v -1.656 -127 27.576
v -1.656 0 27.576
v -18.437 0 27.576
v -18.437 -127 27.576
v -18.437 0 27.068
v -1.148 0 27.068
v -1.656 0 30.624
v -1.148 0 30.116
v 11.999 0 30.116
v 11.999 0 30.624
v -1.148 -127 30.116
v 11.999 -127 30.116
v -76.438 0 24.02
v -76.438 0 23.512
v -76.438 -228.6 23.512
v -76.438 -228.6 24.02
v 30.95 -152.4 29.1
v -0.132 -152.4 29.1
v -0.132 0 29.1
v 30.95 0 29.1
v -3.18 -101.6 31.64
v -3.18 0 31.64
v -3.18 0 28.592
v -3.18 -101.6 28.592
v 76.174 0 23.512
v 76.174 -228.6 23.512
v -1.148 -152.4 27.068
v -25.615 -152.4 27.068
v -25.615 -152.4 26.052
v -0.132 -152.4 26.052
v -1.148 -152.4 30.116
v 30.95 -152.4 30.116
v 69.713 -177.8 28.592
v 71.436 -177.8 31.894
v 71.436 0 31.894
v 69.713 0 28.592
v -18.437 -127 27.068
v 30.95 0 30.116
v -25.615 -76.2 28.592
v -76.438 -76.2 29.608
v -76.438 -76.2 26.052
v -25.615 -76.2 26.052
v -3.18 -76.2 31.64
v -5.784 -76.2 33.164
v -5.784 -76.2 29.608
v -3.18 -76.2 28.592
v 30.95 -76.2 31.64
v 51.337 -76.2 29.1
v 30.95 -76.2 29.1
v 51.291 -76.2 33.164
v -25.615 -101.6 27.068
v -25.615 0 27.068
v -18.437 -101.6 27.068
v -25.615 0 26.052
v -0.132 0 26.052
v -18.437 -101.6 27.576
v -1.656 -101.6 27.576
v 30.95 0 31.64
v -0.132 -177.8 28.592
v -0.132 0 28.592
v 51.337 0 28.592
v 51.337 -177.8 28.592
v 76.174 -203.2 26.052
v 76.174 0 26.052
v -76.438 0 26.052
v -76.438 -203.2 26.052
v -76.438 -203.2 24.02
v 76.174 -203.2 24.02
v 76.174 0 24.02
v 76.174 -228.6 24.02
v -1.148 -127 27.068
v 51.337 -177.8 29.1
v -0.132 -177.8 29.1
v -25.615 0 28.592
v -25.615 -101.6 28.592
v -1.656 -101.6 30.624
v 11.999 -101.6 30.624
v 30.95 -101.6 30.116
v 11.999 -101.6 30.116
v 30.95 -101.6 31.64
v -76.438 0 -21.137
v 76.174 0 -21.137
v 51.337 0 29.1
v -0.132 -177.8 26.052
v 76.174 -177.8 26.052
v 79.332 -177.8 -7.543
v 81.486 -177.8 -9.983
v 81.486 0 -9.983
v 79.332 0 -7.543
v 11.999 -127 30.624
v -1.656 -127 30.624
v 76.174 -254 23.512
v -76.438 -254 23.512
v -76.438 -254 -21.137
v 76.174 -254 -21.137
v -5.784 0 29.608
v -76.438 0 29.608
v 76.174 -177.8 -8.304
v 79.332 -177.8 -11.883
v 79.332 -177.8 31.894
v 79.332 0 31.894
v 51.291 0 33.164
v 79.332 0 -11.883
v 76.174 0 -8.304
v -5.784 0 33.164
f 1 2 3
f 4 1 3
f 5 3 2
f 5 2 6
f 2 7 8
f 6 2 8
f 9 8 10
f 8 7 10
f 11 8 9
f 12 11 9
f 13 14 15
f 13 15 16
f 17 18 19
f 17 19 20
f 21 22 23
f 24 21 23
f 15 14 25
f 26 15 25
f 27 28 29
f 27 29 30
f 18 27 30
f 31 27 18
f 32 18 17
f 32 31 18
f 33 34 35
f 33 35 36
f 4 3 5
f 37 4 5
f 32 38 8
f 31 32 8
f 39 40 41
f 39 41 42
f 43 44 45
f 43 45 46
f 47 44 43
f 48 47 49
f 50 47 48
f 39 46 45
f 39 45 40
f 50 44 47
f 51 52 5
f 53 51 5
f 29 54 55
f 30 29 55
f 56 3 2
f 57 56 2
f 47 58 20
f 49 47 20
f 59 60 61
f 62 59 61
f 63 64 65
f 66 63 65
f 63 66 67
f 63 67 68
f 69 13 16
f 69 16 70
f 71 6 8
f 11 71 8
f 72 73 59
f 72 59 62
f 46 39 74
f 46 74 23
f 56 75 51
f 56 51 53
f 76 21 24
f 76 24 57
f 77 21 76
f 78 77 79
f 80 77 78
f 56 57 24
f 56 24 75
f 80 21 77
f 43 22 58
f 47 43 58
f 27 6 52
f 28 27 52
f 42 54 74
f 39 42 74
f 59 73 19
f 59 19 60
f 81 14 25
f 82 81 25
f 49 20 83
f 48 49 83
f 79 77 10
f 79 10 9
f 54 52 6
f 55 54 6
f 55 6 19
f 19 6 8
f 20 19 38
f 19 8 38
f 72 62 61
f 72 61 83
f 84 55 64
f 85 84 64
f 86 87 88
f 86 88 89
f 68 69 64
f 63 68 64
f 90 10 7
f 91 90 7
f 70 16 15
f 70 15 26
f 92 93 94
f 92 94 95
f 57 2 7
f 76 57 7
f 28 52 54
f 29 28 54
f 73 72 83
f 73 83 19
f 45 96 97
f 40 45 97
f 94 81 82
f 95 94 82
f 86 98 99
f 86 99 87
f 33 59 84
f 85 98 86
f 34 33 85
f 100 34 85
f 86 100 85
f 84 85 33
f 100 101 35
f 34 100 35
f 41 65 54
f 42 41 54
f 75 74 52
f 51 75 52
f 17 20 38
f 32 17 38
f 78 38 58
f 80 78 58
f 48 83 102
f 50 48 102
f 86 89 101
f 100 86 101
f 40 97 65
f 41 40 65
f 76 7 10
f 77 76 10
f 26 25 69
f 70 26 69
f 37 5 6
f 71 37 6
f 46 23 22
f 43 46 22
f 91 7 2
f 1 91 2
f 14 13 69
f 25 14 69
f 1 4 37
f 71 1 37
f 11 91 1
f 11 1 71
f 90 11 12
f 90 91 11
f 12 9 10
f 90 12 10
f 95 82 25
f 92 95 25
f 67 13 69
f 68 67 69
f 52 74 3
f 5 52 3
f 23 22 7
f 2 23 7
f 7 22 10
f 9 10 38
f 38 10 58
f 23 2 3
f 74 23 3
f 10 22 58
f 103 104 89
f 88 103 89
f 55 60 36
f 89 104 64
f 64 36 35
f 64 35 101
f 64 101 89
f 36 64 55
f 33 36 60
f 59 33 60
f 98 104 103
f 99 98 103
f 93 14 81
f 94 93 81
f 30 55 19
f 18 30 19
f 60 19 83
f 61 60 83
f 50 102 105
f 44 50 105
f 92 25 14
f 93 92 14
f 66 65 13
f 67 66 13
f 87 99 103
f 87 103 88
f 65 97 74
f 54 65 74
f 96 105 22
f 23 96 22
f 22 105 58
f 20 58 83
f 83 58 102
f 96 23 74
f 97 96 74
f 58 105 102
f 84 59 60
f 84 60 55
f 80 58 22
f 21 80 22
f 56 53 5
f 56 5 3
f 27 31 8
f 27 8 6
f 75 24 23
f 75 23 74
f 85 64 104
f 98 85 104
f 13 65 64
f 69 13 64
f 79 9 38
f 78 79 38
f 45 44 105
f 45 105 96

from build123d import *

# Parameters (mm, degrees)
F1_DEPTH = 254
F0_W     = 152.611755
F0_H     = 0.508
F2_DEPTH = 228.6
F3_DEPTH = 203.2
F4_DEPTH = 177.8
F5_DEPTH = 177.8
F6_DEPTH = 152.4
F7_DEPTH = 127
F8_DEPTH = 101.6
F9_DEPTH = 76.2


with BuildPart() as f1:
    # F0 (on Front) → F1 (new body)
    with BuildSketch(Plane.XZ):
        Polygon((76.173723, 23.512076), (-76.438032, 23.512076), (-76.438032, -21.137271), (76.173723, -21.137271), (76.173723, -8.303774), align=None)
    extrude(amount=F1_DEPTH)


with BuildPart() as f2:
    # F0 (on Front) → F2 (new body)
    with BuildSketch(Plane.XZ):
        with Locations((-0.132154, 23.766076)):
            Rectangle(F0_W, F0_H)
    extrude(amount=F2_DEPTH)


with BuildPart() as f3:
    # F0 (on Front) → F3 (new body)
    with BuildSketch(Plane.XZ):
        Polygon((-76.438032, 26.052076), (-76.438032, 24.020076), (76.173723, 24.020076), (76.173723, 26.052076), (-0.132155, 26.052076), (-25.615305, 26.052076), align=None)
    extrude(amount=F3_DEPTH)


with BuildPart() as f4:
    # F0 (on Front) → F4 (new body)
    with BuildSketch(Plane.XZ):
        Polygon((76.173723, 24.020076), (76.173723, 23.512076), (76.173723, -8.303774), (79.332203, -11.883393), (81.485704, -9.983249), (79.332203, -7.542609), (79.332203, 31.894118), (71.43601, 31.894118), (69.713205, 28.592076), (51.336631, 28.592076), (-0.132155, 28.592076), (-0.132155, 26.052076), (76.173723, 26.052076), align=None)
    extrude(amount=F4_DEPTH)


with BuildPart() as f5:
    # F0 (on Front) → F5 (new body)
    with BuildSketch(Plane.XZ):
        Polygon((-0.132155, 29.100076), (-0.132155, 28.592076), (51.336631, 28.592076), (51.336631, 29.100076), (30.95011, 29.100076), align=None)
    extrude(amount=F5_DEPTH)


with BuildPart() as f6:
    # F0 (on Front) → F6 (new body)
    with BuildSketch(Plane.XZ):
        Polygon((-25.615305, 27.068076), (-25.615305, 26.052076), (-0.132155, 26.052076), (-0.132155, 28.592076), (-0.132155, 29.100076), (30.95011, 29.100076), (30.95011, 30.116076), (11.999259, 30.116076), (-1.148155, 30.116076), (-1.148155, 27.068076), (-18.436953, 27.068076), align=None)
    extrude(amount=F6_DEPTH)


with BuildPart() as f7:
    # F0 (on Front) → F7 (new body)
    with BuildSketch(Plane.XZ):
        Polygon((-18.436953, 27.576076), (-18.436953, 27.068076), (-1.148155, 27.068076), (-1.148155, 30.116076), (11.999259, 30.116076), (11.999259, 30.624076), (-1.656155, 30.624076), (-1.656155, 27.576076), align=None)
    extrude(amount=F7_DEPTH)


with BuildPart() as f8:
    # F0 (on Front) → F8 (new body)
    with BuildSketch(Plane.XZ):
        Polygon((-25.615305, 28.592076), (-25.615305, 27.068076), (-18.436953, 27.068076), (-18.436953, 27.576076), (-1.656155, 27.576076), (-1.656155, 30.624076), (11.999259, 30.624076), (11.999259, 30.116076), (30.95011, 30.116076), (30.95011, 31.640076), (-3.180155, 31.640076), (-3.180155, 28.592076), align=None)
    extrude(amount=F8_DEPTH)


with BuildPart() as f9:
    # F0 (on Front) → F9 (new body)
    with BuildSketch(Plane.XZ):
        Polygon((-76.438032, 29.608076), (-76.438032, 26.052076), (-25.615305, 26.052076), (-25.615305, 27.068076), (-25.615305, 28.592076), (-3.180155, 28.592076), (-3.180155, 31.640076), (30.95011, 31.640076), (30.95011, 30.116076), (30.95011, 29.100076), (51.336631, 29.100076), (51.291214, 33.163823), (-5.784058, 33.163823), (-5.784058, 29.608076), align=None)
    extrude(amount=F9_DEPTH)


solid = Compound([f1.part, f2.part, f3.part, f4.part, f5.part, f6.part, f7.part, f8.part, f9.part])
